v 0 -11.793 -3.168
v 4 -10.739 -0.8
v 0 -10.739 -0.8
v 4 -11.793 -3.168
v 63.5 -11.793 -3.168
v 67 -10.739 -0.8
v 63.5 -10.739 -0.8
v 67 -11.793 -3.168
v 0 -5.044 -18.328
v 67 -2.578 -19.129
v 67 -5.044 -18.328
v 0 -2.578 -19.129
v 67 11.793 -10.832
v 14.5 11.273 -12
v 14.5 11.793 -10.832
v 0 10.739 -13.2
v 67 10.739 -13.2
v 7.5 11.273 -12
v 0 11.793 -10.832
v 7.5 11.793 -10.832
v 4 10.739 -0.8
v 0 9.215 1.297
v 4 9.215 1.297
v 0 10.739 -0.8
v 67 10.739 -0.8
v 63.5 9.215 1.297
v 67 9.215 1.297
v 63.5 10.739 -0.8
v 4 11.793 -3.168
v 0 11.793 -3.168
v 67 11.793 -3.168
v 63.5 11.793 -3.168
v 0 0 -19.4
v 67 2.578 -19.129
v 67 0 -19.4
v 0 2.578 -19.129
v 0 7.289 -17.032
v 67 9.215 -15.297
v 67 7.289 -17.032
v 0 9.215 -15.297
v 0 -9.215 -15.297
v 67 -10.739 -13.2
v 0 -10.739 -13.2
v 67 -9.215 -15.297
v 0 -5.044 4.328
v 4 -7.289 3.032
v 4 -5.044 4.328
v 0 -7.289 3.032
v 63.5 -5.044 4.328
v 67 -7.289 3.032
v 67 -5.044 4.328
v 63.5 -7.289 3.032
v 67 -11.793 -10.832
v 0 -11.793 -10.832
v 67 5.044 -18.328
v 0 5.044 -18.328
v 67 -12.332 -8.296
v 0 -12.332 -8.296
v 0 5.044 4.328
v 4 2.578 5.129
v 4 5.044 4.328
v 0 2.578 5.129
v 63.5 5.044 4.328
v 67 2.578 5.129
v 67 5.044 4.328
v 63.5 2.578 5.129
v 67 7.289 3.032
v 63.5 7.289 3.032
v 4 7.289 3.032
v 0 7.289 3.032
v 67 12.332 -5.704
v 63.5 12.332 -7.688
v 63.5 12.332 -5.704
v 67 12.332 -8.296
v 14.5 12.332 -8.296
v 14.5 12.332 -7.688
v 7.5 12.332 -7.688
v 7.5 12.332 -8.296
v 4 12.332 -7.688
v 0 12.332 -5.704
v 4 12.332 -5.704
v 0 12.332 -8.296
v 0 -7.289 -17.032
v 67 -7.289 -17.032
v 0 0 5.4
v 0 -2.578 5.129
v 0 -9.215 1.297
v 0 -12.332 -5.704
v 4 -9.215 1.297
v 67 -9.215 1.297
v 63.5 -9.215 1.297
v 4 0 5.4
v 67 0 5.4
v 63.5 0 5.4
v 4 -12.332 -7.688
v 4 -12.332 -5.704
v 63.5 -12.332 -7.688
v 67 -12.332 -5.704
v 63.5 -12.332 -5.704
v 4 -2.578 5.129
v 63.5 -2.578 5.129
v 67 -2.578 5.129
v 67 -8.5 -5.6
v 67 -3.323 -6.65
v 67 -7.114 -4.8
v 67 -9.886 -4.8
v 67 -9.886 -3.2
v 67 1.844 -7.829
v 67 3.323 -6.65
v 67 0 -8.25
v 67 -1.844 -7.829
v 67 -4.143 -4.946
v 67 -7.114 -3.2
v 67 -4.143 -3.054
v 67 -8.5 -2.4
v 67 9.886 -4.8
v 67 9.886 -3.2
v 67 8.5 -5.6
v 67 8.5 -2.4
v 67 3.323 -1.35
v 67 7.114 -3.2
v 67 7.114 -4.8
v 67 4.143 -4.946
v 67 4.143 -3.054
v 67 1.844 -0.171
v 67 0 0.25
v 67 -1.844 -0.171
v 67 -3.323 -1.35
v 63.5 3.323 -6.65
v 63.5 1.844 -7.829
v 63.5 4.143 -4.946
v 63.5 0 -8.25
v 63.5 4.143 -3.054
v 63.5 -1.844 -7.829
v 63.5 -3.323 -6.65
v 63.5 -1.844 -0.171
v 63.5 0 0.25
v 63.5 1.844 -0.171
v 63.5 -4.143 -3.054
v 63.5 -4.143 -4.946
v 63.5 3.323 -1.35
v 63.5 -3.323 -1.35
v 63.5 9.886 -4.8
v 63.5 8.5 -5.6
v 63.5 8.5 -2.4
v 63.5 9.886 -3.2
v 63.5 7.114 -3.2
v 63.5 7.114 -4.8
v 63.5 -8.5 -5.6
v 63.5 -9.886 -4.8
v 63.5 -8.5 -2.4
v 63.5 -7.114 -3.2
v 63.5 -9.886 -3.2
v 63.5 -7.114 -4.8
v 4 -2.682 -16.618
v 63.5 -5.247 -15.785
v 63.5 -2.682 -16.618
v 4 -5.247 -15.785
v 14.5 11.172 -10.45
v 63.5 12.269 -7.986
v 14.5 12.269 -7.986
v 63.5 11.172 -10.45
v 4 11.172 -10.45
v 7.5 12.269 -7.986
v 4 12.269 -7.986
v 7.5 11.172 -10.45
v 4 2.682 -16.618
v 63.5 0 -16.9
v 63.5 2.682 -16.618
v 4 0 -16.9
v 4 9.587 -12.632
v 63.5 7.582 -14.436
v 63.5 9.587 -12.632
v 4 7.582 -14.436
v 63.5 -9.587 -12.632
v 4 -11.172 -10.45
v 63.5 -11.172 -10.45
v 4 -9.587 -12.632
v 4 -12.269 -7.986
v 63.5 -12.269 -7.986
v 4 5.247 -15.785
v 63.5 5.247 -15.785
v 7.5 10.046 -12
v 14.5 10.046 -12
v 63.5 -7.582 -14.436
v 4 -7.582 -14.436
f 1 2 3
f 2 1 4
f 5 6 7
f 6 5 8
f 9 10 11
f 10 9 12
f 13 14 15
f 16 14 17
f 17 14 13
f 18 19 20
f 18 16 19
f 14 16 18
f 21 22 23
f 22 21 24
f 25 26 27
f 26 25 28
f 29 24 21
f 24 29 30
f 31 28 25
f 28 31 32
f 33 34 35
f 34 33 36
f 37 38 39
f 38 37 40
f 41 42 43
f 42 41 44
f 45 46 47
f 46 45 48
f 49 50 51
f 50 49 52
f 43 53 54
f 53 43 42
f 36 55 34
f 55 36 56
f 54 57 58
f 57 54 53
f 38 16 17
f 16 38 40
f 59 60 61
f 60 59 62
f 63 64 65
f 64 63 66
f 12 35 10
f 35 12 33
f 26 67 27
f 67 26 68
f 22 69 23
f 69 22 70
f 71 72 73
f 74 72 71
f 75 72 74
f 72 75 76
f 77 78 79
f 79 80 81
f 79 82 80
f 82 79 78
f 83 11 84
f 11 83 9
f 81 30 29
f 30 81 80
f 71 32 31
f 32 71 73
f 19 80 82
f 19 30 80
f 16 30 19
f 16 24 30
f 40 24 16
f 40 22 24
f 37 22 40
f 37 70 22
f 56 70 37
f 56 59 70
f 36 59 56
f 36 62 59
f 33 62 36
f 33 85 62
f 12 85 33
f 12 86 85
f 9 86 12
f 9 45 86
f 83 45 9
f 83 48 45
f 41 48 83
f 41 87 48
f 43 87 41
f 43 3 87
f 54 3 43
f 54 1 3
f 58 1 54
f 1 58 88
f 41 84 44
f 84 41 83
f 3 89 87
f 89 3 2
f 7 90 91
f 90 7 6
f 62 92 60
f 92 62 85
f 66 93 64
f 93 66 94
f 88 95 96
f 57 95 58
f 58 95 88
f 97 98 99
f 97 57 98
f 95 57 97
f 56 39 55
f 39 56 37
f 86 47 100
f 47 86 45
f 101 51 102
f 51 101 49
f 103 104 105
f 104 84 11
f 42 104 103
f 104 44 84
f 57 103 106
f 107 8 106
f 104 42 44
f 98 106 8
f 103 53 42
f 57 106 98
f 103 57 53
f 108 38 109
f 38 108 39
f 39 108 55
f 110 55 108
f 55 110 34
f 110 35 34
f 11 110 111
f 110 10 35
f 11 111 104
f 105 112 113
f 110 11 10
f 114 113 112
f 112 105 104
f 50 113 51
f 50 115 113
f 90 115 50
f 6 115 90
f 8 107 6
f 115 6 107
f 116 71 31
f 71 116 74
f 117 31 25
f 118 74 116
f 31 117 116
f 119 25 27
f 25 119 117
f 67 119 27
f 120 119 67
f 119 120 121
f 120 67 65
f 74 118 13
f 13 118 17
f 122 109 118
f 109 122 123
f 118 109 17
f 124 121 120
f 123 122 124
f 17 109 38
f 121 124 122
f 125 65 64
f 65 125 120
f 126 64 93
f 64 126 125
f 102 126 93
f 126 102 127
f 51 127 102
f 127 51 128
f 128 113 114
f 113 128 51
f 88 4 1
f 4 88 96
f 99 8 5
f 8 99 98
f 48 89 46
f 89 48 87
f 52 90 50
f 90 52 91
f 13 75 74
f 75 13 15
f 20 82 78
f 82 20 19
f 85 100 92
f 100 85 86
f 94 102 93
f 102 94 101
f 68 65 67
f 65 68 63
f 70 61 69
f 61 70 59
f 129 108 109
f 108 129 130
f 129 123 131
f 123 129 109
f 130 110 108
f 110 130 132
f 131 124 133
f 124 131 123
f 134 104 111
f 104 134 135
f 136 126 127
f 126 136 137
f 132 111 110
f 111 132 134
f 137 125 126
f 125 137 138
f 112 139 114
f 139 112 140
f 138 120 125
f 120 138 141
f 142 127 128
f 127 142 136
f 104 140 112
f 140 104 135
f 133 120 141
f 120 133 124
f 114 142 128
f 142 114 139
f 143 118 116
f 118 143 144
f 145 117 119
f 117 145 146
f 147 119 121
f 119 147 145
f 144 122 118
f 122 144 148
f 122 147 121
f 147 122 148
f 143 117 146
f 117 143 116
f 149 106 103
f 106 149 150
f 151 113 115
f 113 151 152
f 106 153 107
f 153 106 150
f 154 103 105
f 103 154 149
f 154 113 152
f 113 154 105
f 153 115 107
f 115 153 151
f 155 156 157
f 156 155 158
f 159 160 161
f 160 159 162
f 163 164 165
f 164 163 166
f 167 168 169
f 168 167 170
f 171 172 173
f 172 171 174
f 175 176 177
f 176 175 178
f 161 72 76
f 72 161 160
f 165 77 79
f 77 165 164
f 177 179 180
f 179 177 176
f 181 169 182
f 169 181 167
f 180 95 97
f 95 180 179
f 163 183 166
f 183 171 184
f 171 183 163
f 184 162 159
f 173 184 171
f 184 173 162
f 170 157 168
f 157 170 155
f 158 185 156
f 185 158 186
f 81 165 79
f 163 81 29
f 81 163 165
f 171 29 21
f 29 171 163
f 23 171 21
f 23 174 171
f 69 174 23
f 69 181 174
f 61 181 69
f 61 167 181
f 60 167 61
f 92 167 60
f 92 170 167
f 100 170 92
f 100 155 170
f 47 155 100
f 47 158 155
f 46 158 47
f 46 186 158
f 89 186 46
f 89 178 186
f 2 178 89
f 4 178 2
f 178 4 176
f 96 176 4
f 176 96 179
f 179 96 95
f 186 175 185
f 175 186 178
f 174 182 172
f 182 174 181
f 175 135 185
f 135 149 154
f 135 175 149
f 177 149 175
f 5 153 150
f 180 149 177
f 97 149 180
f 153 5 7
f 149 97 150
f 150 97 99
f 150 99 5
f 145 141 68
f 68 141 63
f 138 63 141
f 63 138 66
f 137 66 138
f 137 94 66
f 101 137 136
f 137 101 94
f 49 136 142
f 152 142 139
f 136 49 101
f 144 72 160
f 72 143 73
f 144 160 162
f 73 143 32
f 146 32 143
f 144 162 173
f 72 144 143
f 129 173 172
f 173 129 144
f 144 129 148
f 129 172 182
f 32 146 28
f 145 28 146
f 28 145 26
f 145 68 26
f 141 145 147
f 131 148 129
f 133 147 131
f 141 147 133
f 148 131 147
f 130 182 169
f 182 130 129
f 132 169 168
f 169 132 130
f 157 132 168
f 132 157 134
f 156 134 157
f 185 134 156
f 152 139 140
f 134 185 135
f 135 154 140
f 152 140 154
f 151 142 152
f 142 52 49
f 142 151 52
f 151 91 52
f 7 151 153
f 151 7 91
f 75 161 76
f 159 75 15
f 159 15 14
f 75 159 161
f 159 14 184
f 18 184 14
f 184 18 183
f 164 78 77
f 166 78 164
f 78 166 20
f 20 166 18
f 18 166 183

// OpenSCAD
// file: ../robot_settings.scad
main_box_x = 95; // 96
main_box_y = 102;
main_box_z = 74; // 74.5
wall_thickness = 2;

rail_gap = 2;
rail_inset = 7;

rail_thickness = 7;
rail_length = 250;
rail_width = 200;

raspberry_pi_screw_seperation_y = 57;
raspberry_pi_screw_seperation_z = 48;
raspberry_pi_peg_h = 5;

battery_box_peg_h = 6;
battery_box_peg_d = 8;
battery_box_peg_cutout = 5;

gears_module = 1;
pinion_gear_teeth = 32;
pinion_gear_width = 5;
pinion_gear_bore = 8;

gears_setback_distance = 25;
gear_post_height = 2 * pinion_gear_width + rail_thickness + 8 ;

steering_motor_mount_x = 45;
steering_motor_mount_y = 36;
steering_motor_mount_z = 18;
steering_motor_mount_setback_distance = gears_setback_distance + 16;

dc_motor_drivertype = "Teyleten"; // Teyleten
isAdafruit = (dc_motor_drivertype == "Adafruit");

drv8871_x = isAdafruit ? 20.3 : 21.6;
drv8871_y = isAdafruit ?  24 : 25;

drv8871_z = 2;
drv8871_screw_d = 2.5;
drv8871_solder_points_z = 2;

drv8871mount_edge_x = 1.5;
drv8871mount_edge_wall = 3;
drv8871mount_z = 5;
drv8871mount_x = drv8871_x +  drv8871mount_edge_wall - 2* drv8871mount_edge_x;
drv8871mount_y = 19;

drv8871_screw_distance = 15.64;
drv8871_solder_points_d = 1.66;
drv8871_solder_offset_y = 4.4;
drv8871_solder_inner_points_distance = 5;
drv8871_solder_outer_points_distance = 12;

dc_motor_housing_minus_encoder_z = 48;
dc_motor_encoder_z = 9.33;
dc_motor_encoder_wheel_d = 13.4;
dc_motor_encoder_wheel_thickness = 5;
dc_motor_encoder_wheel_gap = 3;
dc_motor_encoder_circuit_thickness = 2;
dc_motor_cutout_d = 24.8;
dc_motor_cutout_z = 19.5;

dc_motor_screw_head_z = 2;
dc_motor_screw_head_d = 5.6;
dc_motor_screw_d = 3.2;
dc_motor_screw_offset = 8.5;

dc_motor_axle_ring_z = 3;
dc_motor_axle_ring_d = 7.2;
dc_motor_axle_cutout_d = 4.2;
dc_motor_axle_cutout_z = 10;
dc_motor_axle_notch_cutout = 0.4;
dc_motor_axle_notch_cutout_z = 6;

pdmount_x = 20;
pdmount_y = 30;
pdmount_z = 2;
pdmount_edge_x = 1.5;
pdmount_edge_wall = 3;

steering_shaft_z = 45;
steering_shaft_d = 7;
steering_shaft_motor_fitting_d = 9;
coupler_length = 24.6;
coupler_diameter = 14;
coupler_screw_d = 4;
coupler_screw_z_offset = 5;
coupler_gear_side_insert = 12.6;
steering_shaft_with_coupler_z = steering_shaft_z - coupler_gear_side_insert;

lidar_mount_y = 110;
lidar_mount_x = 65 + 20;
lidar_narrow_screws = 40;
lidar_wide_screws = 56;
lidar_front_to_back_screws = 70;
lidar_screw_d = 3;
lidar_circuitboard_x = 20;
lidar_circuitboard_y = 35;
lidar_circuitboard_z = 1.2;
lidar_cord_length = 29;

ball_bearing_height = 7;
ball_bearing_outer_diameter = 22;
ball_bearing_inner_diameter = 8;

M4_diameter = 5.1;
M3_diameter = 2.9;
M3_length = 35;
M3_cap_length= 3;
M3_cap_diameter = 5.44;

suspension_spring_outer_diameter = 8;
suspension_spring_inner_diameter = 5.3;

armature_holder_height = 20;
armature_holder_thickness = 8;
pull_bar_peg_r = 3.2;
apparatus_locking_peg_d = 4;

rack_module = 1;
rack_length = main_box_x;
rack_height = 5;
rack_width = 10;
rack_teeth = 30;
rack_bore = 3;

pull_bar_length = rail_width / 2 - rack_length + 1;

// tire hardware
axle_length = 24; 
axle_reciever_inner_diameter = 8.2;
axle_reciever_outer_diameter = 12;
axle_reciever_length = 18.8;
axle_notch_length = 7;
axle_notch_cutout = 2.4;

// power distribution bar
power_bar_cutout_x = 96;
power_bar_y = 19.1;
power_bar_z = 1.5;
power_bar_screw_distance = 91.4;
power_bar_screw_d = 2.8;
power_bar_standoff_z = 5;
power_bar_standoff_d = 6.83;

pico_expander_width = 63;
pico_expander_height = 57;
pico_screw_hole_offset = 3;
pico_screw_hole_d = 2.5;

usbhub_thickness = 11.7;
usbhub_depth = 37.5;
usbhub_width = 86.7;
usbhub_end_port_width = 14.8;
usbhub_end_port_height = 12;
usbhub_front_face_safe_zone_left = 15;
usbhub_front_face_safe_zone_right = 14.8;

switch_w = 16;
switch_cutout_d = 12.2;
switch_bump_h = 2;
switch_bump_l = 18.2;
// main file
include <../robot_settings.scad>

module steering_motor_holder() {
        translate([0, 0, 0]) {
            difference() {
                color("red")
                difference() {
                  translate([0, 0, -7])
                  rotate([0, 90, 0])
                  cylinder(h = 67, d = dc_motor_cutout_d);
          
                 // axle hole
                translate([60, 0, -4])
                  rotate([0, 90, 0])
                  cylinder(h = 20, d = dc_motor_screw_offset);
                 
                 // screw hole
                translate([60, dc_motor_screw_offset, -4])
                 rotate([0, 90, 0])
                 cylinder(h = 20, d = dc_motor_screw_d);
                 
                 // screw hole
                translate([60, -dc_motor_screw_offset, -4])
                 rotate([0, 90, 0])
                 cylinder(h = 20, d = dc_motor_screw_d);
              }
 
             color("green") 
              translate([4, 0, -4])
              rotate([0, 90, 0])
              cylinder(h = 59.5, d = dc_motor_cutout_d + 1);   

              // curcuit board connector cutout
              translate([7.5, 10, -12])
              cube([7, 3,  5]);
          }
      }
    }
    steering_motor_holder();
